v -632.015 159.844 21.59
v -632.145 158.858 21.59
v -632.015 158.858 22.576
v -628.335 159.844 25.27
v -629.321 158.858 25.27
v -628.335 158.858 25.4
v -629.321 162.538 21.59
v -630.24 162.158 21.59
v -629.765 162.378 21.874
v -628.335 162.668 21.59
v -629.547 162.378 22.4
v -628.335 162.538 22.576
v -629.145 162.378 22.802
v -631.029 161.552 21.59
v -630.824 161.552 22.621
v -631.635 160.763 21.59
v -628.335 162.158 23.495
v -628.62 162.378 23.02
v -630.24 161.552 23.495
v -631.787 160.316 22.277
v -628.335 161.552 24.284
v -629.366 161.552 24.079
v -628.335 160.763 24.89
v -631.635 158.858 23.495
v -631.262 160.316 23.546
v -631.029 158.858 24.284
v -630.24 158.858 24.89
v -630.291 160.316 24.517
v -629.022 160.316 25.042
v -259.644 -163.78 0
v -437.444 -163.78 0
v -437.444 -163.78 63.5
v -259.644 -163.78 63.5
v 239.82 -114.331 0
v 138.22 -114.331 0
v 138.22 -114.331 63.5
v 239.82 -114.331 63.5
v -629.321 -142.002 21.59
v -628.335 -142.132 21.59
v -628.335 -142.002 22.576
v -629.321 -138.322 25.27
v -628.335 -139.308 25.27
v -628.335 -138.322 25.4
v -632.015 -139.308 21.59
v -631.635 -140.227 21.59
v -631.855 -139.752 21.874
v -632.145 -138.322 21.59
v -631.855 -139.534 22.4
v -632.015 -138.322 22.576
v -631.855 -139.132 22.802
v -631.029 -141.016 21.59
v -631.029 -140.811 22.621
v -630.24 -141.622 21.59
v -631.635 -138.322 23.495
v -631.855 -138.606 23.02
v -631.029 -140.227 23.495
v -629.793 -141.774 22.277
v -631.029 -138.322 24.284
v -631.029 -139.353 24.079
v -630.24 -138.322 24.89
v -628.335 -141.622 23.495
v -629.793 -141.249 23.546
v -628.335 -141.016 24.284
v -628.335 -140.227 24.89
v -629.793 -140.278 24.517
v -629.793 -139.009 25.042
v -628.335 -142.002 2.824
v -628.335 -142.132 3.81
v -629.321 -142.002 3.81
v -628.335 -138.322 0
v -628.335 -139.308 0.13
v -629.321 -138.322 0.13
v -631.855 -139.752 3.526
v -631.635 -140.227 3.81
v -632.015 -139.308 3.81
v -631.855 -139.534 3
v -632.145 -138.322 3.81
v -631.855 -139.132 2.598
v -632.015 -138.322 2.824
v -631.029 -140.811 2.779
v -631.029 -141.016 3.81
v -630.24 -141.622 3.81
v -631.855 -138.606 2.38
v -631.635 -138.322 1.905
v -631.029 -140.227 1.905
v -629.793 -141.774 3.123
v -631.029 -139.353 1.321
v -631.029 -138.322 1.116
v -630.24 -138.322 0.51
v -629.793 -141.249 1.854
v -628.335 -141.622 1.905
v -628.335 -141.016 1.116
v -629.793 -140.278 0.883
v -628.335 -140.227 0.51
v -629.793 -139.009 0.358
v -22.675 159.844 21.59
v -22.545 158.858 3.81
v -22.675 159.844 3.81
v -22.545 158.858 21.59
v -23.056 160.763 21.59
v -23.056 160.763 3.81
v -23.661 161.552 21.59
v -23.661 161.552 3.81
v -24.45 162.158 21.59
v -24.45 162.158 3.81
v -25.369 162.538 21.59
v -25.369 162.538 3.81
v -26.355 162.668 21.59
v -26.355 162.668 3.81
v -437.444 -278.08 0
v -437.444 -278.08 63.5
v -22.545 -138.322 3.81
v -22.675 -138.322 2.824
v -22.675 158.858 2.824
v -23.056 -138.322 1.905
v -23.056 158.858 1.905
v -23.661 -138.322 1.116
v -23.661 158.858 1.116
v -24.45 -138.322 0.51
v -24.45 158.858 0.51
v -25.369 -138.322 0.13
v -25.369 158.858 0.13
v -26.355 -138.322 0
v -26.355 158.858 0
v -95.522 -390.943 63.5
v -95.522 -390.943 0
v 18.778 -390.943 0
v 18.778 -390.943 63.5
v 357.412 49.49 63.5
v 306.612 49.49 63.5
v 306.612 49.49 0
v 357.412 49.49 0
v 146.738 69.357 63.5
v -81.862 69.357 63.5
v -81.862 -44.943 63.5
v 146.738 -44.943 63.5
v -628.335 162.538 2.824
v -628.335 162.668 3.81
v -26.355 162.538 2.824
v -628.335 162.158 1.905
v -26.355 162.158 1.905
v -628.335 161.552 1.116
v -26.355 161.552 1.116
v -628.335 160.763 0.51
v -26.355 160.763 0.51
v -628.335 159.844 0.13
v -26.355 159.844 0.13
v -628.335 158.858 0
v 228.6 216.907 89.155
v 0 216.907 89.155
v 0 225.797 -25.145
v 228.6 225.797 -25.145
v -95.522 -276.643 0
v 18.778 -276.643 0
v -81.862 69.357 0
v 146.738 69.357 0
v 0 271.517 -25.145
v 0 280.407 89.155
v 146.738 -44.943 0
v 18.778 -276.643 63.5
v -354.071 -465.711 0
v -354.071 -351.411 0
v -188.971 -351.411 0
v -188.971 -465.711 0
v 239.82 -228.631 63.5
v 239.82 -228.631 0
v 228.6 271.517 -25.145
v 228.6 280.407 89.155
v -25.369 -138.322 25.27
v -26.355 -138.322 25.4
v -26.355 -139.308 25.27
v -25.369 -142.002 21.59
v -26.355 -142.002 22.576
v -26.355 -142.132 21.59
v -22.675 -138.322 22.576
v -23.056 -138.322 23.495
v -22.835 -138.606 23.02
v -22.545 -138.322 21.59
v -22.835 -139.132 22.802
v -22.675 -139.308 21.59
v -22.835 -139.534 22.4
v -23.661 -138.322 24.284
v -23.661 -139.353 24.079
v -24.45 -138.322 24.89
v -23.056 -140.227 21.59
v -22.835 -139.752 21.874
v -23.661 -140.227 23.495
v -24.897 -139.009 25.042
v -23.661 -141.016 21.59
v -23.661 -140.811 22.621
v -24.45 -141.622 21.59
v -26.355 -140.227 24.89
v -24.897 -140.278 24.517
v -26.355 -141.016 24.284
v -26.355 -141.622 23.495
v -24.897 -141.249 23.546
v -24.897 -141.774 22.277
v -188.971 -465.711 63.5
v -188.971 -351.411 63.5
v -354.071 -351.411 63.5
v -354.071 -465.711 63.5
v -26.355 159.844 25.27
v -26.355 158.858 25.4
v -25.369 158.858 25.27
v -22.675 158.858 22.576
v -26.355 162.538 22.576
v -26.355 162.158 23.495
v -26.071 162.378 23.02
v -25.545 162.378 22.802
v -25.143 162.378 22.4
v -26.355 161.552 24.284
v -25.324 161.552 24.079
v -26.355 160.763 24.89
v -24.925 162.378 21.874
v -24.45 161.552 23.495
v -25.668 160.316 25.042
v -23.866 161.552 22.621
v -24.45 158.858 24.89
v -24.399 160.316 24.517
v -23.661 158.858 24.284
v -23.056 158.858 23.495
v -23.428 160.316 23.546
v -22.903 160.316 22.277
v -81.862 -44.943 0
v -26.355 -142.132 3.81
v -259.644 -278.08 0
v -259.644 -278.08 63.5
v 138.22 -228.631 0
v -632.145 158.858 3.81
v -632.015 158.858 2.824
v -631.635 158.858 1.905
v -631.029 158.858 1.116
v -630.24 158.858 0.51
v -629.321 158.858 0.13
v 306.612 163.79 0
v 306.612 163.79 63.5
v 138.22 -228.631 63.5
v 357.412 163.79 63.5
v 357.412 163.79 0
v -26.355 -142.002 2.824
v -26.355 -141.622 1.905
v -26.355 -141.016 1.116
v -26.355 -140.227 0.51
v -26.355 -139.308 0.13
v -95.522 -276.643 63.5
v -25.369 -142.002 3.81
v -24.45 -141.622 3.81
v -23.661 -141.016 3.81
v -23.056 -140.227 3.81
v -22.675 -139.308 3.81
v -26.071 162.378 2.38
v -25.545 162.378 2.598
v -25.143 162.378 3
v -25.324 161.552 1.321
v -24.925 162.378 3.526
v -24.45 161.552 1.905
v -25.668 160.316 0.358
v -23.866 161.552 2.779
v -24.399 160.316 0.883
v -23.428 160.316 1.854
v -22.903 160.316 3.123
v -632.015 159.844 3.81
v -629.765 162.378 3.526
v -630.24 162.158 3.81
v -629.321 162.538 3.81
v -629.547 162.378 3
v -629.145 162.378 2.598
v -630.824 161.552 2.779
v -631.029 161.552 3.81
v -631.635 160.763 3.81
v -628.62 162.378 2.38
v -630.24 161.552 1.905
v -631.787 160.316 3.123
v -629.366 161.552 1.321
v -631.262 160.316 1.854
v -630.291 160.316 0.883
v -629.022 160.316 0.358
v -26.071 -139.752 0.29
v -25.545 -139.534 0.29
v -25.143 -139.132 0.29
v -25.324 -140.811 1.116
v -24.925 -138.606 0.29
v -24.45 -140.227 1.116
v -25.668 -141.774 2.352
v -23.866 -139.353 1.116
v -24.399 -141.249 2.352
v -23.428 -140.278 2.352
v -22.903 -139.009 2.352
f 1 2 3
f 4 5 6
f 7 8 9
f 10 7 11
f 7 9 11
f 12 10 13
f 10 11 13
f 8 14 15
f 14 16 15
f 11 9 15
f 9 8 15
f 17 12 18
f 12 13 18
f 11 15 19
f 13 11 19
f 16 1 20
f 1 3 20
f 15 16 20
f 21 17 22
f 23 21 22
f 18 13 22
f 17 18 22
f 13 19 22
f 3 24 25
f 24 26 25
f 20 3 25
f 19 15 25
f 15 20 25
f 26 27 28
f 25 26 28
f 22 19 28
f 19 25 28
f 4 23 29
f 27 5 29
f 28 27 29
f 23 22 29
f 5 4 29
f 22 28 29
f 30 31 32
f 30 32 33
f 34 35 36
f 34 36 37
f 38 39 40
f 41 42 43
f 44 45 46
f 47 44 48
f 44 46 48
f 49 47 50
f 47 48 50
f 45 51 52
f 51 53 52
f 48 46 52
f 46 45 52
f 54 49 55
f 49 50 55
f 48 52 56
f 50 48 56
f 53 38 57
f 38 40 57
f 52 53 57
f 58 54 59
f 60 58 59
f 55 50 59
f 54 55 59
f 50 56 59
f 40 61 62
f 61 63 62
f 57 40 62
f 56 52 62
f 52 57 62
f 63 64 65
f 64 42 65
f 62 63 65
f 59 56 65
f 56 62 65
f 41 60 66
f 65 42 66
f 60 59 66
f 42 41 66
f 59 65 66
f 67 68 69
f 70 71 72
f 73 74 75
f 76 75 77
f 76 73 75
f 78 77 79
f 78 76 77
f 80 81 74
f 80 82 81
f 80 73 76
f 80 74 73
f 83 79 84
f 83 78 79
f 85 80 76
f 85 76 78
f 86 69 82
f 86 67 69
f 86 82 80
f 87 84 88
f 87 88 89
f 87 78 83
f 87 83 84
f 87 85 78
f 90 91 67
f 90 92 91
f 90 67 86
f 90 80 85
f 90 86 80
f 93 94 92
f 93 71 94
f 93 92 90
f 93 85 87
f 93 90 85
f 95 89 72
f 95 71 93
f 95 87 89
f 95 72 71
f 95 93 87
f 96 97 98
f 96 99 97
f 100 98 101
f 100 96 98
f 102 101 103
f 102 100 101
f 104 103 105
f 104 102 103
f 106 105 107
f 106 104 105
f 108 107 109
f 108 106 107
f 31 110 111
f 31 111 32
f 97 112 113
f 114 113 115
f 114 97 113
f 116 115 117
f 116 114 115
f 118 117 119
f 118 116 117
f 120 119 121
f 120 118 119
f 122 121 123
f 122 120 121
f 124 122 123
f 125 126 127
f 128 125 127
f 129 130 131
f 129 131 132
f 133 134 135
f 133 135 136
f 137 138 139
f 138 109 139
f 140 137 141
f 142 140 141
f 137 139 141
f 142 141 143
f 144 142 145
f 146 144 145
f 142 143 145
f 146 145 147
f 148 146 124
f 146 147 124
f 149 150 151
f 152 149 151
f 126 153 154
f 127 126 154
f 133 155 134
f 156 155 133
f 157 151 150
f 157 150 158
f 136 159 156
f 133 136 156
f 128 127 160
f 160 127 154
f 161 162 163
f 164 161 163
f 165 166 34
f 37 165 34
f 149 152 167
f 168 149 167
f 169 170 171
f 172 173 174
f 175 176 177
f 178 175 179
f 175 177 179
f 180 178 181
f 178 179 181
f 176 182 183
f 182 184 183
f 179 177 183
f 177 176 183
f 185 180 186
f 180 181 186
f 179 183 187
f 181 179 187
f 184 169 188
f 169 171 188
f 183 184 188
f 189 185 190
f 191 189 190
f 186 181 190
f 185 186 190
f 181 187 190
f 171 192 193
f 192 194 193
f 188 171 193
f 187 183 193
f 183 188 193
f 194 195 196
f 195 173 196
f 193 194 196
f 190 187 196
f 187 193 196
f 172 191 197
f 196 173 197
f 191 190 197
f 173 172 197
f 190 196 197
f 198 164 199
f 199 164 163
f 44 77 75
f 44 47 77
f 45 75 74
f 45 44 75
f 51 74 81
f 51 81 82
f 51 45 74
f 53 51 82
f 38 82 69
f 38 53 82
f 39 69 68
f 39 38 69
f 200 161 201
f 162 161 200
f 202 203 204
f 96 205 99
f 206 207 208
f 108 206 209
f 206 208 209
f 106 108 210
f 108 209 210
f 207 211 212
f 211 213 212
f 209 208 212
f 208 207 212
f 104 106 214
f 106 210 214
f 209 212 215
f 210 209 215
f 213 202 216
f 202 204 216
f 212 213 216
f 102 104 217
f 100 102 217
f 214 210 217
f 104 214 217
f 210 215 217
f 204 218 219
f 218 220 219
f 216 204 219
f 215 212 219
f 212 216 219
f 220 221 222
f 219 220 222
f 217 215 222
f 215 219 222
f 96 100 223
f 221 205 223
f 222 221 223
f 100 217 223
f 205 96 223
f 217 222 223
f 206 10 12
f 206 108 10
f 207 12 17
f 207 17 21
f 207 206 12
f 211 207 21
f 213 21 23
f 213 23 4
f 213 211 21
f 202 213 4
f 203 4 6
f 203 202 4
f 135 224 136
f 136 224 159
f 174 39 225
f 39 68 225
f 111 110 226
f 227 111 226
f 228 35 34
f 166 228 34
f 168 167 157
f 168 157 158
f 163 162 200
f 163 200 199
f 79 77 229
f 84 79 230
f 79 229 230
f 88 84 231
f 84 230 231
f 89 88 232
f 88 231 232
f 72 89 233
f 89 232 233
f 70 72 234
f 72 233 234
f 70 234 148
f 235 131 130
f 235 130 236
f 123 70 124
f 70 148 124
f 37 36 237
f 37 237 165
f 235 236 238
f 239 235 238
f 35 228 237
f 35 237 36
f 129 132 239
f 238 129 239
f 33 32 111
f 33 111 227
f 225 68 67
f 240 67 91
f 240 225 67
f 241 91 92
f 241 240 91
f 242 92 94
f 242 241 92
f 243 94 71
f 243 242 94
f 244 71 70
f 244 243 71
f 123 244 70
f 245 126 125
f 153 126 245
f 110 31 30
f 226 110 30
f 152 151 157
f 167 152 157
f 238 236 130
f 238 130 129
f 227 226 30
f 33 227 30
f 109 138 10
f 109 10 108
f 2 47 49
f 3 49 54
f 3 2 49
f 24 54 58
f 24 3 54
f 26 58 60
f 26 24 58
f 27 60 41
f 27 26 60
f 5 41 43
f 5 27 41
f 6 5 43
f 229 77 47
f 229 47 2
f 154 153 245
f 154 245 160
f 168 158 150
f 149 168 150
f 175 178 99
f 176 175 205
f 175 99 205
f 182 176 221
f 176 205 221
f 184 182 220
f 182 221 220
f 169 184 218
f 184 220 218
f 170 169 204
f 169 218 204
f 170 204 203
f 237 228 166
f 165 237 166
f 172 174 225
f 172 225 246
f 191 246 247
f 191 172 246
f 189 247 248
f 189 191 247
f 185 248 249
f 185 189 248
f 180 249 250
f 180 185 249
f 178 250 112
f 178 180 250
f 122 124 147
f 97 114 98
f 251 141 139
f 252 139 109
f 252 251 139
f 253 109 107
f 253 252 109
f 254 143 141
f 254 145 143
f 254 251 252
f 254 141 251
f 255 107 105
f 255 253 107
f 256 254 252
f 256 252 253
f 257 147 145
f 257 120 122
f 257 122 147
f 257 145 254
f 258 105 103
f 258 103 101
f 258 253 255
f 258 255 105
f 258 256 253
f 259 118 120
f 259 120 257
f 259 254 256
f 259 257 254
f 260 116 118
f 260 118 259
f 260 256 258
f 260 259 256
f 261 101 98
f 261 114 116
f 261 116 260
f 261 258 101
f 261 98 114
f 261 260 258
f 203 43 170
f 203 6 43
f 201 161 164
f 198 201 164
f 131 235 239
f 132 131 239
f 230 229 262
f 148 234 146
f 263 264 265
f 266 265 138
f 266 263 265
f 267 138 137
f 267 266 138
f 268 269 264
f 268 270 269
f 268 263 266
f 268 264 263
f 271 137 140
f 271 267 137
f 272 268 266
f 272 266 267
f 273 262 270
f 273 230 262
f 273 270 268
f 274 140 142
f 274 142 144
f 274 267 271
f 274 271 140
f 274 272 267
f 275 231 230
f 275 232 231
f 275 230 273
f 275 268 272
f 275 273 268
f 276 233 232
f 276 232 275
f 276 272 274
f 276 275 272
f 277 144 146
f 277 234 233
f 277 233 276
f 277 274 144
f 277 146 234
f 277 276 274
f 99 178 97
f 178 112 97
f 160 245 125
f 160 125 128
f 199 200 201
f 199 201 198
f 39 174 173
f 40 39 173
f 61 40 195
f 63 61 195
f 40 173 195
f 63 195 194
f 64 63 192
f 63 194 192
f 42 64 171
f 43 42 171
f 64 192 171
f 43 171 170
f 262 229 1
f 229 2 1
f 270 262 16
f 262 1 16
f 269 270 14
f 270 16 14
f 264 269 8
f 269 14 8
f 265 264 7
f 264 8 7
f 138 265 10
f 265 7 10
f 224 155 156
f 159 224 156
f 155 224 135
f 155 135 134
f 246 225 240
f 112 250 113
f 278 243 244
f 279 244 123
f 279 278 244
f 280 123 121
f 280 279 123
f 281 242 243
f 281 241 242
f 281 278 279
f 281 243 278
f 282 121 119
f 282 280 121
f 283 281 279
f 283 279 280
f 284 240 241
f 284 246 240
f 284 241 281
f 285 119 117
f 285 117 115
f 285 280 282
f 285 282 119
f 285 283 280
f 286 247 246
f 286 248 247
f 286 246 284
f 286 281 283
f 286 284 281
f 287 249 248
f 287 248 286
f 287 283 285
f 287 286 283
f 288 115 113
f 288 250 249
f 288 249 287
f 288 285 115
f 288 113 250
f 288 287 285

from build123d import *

# Parameters (mm, degrees)
F0_W      = 228.6
F0_H      = 114.3
F1_DEPTH  = 63.5
F2_W      = 609.6
F2_H      = 304.8
F3_DEPTH  = 25.4
F4_R      = 3.81
F5_W      = 101.6
F5_H      = 114.3
F6_DEPTH  = 63.5
F7_W      = 177.8
F7_H      = 114.3
F8_DEPTH  = 63.5
F9_W      = 114.3
F9_H      = 114.3
F10_DEPTH = 63.5
F11_W     = 165.1
F11_H     = 114.3
F12_DEPTH = 63.5
F13_W     = 50.8
F13_H     = 114.3
F14_DEPTH = 63.5
F16_DEPTH = 228.6


with BuildPart() as f1:
    # F0 (on Top) → F1 (new body)
    with BuildSketch(Plane.XY):
        with Locations((32.43839, 12.207375)):
            Rectangle(F0_W, F0_H)
    extrude(amount=F1_DEPTH)


with BuildPart() as f3:
    # F2 (on Top) → F3 (new body)
    with BuildSketch(Plane.XY):
        with Locations((-327.345071, 10.267949)):
            Rectangle(F2_W, F2_H)
    extrude(amount=F3_DEPTH)

    # F4
    f4_edges = [f3.edges().sort_by_distance(p)[0] for p in [
        (-327.345071, -142.132051, 25.4),
        (-22.545071, 10.267949, 25.4),
        (-22.545071, -142.132051, 12.7),
        (-327.345071, -142.132051, 0),
        (-22.545071, 10.267949, 0),
        (-632.145071, -142.132051, 12.7),
        (-632.145071, 10.267949, 25.4),
        (-632.145071, 10.267949, 0),
        (-632.145071, 162.667949, 12.7),
        (-327.345071, 162.667949, 25.4),
        (-327.345071, 162.667949, 0),
        (-22.545071, 162.667949, 12.7),
    ]]
    fillet(f4_edges, radius=F4_R)


with BuildPart() as f6:
    # F5 (on Top) → F6 (new body)
    with BuildSketch(Plane.XY):
        with Locations((189.019965, -171.481449)):
            Rectangle(F5_W, F5_H)
    extrude(amount=F6_DEPTH)


with BuildPart() as f8:
    # F7 (on Top) → F8 (new body)
    with BuildSketch(Plane.XY):
        with Locations((-348.543853, -220.930122)):
            Rectangle(F7_W, F7_H)
    extrude(amount=F8_DEPTH)


with BuildPart() as f10:
    # F9 (on Top) → F10 (new body)
    with BuildSketch(Plane.XY):
        with Locations((-38.371608, -333.79276)):
            Rectangle(F9_W, F9_H)
    extrude(amount=F10_DEPTH)


with BuildPart() as f12:
    # F11 (on Top) → F12 (new body)
    with BuildSketch(Plane.XY):
        with Locations((-271.520673, -408.56068)):
            Rectangle(F11_W, F11_H)
    extrude(amount=F12_DEPTH)


with BuildPart() as f14:
    # F13 (on Top) → F14 (new body)
    with BuildSketch(Plane.XY):
        with Locations((332.012467, 106.640312)):
            Rectangle(F13_W, F13_H)
    extrude(amount=F14_DEPTH)


with BuildPart() as f16:
    # F15 (on Right) → F16 (new body)
    with BuildSketch(Plane.YZ):
        Polygon((280.407198, 89.155098), (216.907198, 89.155098), (225.797198, -25.144902), (271.517198, -25.144902), align=None)
    extrude(amount=F16_DEPTH)


solid = Compound([f1.part, f3.part, f6.part, f8.part, f10.part, f12.part, f14.part, f16.part])
